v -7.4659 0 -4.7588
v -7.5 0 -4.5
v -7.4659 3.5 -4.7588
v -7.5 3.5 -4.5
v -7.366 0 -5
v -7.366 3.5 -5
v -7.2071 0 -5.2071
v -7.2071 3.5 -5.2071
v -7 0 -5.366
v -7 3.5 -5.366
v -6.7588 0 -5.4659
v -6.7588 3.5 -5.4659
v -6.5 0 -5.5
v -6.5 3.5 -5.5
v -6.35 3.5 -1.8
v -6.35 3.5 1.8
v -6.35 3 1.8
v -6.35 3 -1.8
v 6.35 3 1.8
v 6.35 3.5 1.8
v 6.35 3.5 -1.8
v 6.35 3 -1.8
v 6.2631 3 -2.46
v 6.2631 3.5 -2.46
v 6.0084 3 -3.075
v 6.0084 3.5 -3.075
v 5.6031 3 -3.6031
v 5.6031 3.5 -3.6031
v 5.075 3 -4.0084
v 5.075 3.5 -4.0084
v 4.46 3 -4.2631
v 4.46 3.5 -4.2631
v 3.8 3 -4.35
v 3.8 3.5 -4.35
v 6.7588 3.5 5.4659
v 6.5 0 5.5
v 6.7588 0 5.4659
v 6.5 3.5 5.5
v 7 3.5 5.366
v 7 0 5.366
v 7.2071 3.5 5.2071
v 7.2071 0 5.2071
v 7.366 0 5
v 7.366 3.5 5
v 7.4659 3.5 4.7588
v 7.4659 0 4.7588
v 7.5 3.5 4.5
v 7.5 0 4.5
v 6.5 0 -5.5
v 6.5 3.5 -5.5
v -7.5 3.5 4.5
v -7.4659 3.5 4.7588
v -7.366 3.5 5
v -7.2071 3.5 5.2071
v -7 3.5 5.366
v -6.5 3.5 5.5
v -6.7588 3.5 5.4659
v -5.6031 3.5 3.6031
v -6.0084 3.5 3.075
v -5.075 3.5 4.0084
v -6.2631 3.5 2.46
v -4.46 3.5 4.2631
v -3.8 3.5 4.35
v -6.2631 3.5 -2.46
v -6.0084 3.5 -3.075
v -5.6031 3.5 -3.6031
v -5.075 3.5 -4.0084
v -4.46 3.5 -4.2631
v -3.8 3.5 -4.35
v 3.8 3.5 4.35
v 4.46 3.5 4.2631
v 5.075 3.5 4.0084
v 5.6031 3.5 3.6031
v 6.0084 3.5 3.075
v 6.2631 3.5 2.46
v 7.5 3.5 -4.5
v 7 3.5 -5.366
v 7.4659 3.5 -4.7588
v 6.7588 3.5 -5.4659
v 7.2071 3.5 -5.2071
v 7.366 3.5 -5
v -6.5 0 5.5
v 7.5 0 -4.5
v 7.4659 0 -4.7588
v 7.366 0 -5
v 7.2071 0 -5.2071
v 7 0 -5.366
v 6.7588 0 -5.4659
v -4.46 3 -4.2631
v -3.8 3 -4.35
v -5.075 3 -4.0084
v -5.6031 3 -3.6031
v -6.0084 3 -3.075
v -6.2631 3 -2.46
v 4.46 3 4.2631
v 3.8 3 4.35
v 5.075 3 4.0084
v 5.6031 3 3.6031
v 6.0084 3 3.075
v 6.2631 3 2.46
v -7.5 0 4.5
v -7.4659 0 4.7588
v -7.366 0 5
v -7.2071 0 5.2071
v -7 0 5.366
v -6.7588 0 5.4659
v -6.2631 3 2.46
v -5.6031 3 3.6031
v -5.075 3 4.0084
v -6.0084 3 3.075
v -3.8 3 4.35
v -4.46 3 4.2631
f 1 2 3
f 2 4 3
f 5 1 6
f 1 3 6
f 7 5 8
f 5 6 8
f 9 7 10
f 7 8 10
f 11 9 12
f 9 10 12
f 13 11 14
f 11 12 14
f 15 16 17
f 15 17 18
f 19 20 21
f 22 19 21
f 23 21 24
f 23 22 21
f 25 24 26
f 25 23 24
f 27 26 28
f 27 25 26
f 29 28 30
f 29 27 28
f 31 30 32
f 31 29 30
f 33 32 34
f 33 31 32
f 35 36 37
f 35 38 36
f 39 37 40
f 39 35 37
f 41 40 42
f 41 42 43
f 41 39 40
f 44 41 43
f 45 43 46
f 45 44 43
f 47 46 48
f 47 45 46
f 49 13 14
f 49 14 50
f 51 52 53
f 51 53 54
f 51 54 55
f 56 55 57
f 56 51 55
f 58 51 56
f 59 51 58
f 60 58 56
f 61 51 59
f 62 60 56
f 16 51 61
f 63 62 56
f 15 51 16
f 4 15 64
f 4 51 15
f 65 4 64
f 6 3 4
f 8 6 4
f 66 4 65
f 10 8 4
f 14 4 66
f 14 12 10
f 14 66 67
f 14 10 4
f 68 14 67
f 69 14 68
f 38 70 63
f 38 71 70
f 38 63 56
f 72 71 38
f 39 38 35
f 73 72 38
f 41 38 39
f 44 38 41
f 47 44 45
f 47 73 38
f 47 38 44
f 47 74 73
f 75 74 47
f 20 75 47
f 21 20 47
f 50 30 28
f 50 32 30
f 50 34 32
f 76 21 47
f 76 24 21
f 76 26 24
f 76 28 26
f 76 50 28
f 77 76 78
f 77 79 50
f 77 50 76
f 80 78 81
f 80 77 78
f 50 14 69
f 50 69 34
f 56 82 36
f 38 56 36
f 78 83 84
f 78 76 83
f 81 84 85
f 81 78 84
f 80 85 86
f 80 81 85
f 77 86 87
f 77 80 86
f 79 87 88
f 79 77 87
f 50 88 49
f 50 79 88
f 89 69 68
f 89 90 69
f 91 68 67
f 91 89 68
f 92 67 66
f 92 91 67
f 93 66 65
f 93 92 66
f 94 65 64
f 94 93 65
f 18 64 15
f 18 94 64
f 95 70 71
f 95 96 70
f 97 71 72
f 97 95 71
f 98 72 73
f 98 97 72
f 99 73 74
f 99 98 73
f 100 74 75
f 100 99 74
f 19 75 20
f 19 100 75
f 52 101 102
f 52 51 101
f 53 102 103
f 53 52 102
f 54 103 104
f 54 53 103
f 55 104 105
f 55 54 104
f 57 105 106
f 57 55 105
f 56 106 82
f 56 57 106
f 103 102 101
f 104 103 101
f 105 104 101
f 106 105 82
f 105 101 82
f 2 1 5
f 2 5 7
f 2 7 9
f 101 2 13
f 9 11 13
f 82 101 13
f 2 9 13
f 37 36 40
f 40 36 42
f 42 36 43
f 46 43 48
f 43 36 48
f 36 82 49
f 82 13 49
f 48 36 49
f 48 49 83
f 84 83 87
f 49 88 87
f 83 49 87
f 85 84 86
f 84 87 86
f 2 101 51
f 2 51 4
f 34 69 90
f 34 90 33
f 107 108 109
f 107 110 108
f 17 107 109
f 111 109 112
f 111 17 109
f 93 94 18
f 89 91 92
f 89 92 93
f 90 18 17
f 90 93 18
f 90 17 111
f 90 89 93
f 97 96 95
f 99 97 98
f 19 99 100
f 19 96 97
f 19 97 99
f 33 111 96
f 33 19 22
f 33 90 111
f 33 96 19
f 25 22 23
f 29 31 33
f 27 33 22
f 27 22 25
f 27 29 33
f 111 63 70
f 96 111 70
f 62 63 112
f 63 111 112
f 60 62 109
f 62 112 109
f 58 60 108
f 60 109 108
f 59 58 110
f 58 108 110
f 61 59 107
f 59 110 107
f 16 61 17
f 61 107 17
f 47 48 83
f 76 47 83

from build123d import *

# Parameters (mm, degrees)
SKETCH1_W           = 15
SKETCH1_H           = 11
BOSS_EXTRUDE1_DEPTH = 3.5
FILLET1_R           = 1
SKETCH2_W           = 12.7
SKETCH2_H           = 8.7
CUT_EXTRUDE1_DEPTH  = 0.5
FILLET2_R           = 2.55


with BuildPart() as part:
    # Sketch1 → Boss-Extrude1 (new body)
    with BuildSketch(Plane(origin=(0, 0, 0), x_dir=(1, 0, 0), z_dir=(0, 1, 0))):
        Rectangle(SKETCH1_W, SKETCH1_H)
    extrude(amount=BOSS_EXTRUDE1_DEPTH)

    # Fillet1
    fillet1_edges = [part.edges().sort_by_distance(p)[0] for p in [
        (7.5, 1.75, 5.5),
        (-7.5, 1.75, 5.5),
        (-7.5, 1.75, -5.5),
        (7.5, 1.75, -5.5),
    ]]
    fillet(fillet1_edges, radius=FILLET1_R)

    # Sketch2 → Cut-Extrude1 (cut)
    with BuildSketch(Plane(origin=(0, 3.5, 0), x_dir=(1, 0, 0), z_dir=(0, 1, 0))):
        Rectangle(SKETCH2_W, SKETCH2_H)
    extrude(amount=-CUT_EXTRUDE1_DEPTH, mode=Mode.SUBTRACT)

    # Fillet2
    fillet2_edges = [part.edges().sort_by_distance(p)[0] for p in [
        (6.35, 3.25, -4.35),
        (6.35, 3.25, 4.35),
        (-6.35, 3.25, 4.35),
        (-6.35, 3.25, -4.35),
    ]]
    fillet(fillet2_edges, radius=FILLET2_R)


solid = part.part
